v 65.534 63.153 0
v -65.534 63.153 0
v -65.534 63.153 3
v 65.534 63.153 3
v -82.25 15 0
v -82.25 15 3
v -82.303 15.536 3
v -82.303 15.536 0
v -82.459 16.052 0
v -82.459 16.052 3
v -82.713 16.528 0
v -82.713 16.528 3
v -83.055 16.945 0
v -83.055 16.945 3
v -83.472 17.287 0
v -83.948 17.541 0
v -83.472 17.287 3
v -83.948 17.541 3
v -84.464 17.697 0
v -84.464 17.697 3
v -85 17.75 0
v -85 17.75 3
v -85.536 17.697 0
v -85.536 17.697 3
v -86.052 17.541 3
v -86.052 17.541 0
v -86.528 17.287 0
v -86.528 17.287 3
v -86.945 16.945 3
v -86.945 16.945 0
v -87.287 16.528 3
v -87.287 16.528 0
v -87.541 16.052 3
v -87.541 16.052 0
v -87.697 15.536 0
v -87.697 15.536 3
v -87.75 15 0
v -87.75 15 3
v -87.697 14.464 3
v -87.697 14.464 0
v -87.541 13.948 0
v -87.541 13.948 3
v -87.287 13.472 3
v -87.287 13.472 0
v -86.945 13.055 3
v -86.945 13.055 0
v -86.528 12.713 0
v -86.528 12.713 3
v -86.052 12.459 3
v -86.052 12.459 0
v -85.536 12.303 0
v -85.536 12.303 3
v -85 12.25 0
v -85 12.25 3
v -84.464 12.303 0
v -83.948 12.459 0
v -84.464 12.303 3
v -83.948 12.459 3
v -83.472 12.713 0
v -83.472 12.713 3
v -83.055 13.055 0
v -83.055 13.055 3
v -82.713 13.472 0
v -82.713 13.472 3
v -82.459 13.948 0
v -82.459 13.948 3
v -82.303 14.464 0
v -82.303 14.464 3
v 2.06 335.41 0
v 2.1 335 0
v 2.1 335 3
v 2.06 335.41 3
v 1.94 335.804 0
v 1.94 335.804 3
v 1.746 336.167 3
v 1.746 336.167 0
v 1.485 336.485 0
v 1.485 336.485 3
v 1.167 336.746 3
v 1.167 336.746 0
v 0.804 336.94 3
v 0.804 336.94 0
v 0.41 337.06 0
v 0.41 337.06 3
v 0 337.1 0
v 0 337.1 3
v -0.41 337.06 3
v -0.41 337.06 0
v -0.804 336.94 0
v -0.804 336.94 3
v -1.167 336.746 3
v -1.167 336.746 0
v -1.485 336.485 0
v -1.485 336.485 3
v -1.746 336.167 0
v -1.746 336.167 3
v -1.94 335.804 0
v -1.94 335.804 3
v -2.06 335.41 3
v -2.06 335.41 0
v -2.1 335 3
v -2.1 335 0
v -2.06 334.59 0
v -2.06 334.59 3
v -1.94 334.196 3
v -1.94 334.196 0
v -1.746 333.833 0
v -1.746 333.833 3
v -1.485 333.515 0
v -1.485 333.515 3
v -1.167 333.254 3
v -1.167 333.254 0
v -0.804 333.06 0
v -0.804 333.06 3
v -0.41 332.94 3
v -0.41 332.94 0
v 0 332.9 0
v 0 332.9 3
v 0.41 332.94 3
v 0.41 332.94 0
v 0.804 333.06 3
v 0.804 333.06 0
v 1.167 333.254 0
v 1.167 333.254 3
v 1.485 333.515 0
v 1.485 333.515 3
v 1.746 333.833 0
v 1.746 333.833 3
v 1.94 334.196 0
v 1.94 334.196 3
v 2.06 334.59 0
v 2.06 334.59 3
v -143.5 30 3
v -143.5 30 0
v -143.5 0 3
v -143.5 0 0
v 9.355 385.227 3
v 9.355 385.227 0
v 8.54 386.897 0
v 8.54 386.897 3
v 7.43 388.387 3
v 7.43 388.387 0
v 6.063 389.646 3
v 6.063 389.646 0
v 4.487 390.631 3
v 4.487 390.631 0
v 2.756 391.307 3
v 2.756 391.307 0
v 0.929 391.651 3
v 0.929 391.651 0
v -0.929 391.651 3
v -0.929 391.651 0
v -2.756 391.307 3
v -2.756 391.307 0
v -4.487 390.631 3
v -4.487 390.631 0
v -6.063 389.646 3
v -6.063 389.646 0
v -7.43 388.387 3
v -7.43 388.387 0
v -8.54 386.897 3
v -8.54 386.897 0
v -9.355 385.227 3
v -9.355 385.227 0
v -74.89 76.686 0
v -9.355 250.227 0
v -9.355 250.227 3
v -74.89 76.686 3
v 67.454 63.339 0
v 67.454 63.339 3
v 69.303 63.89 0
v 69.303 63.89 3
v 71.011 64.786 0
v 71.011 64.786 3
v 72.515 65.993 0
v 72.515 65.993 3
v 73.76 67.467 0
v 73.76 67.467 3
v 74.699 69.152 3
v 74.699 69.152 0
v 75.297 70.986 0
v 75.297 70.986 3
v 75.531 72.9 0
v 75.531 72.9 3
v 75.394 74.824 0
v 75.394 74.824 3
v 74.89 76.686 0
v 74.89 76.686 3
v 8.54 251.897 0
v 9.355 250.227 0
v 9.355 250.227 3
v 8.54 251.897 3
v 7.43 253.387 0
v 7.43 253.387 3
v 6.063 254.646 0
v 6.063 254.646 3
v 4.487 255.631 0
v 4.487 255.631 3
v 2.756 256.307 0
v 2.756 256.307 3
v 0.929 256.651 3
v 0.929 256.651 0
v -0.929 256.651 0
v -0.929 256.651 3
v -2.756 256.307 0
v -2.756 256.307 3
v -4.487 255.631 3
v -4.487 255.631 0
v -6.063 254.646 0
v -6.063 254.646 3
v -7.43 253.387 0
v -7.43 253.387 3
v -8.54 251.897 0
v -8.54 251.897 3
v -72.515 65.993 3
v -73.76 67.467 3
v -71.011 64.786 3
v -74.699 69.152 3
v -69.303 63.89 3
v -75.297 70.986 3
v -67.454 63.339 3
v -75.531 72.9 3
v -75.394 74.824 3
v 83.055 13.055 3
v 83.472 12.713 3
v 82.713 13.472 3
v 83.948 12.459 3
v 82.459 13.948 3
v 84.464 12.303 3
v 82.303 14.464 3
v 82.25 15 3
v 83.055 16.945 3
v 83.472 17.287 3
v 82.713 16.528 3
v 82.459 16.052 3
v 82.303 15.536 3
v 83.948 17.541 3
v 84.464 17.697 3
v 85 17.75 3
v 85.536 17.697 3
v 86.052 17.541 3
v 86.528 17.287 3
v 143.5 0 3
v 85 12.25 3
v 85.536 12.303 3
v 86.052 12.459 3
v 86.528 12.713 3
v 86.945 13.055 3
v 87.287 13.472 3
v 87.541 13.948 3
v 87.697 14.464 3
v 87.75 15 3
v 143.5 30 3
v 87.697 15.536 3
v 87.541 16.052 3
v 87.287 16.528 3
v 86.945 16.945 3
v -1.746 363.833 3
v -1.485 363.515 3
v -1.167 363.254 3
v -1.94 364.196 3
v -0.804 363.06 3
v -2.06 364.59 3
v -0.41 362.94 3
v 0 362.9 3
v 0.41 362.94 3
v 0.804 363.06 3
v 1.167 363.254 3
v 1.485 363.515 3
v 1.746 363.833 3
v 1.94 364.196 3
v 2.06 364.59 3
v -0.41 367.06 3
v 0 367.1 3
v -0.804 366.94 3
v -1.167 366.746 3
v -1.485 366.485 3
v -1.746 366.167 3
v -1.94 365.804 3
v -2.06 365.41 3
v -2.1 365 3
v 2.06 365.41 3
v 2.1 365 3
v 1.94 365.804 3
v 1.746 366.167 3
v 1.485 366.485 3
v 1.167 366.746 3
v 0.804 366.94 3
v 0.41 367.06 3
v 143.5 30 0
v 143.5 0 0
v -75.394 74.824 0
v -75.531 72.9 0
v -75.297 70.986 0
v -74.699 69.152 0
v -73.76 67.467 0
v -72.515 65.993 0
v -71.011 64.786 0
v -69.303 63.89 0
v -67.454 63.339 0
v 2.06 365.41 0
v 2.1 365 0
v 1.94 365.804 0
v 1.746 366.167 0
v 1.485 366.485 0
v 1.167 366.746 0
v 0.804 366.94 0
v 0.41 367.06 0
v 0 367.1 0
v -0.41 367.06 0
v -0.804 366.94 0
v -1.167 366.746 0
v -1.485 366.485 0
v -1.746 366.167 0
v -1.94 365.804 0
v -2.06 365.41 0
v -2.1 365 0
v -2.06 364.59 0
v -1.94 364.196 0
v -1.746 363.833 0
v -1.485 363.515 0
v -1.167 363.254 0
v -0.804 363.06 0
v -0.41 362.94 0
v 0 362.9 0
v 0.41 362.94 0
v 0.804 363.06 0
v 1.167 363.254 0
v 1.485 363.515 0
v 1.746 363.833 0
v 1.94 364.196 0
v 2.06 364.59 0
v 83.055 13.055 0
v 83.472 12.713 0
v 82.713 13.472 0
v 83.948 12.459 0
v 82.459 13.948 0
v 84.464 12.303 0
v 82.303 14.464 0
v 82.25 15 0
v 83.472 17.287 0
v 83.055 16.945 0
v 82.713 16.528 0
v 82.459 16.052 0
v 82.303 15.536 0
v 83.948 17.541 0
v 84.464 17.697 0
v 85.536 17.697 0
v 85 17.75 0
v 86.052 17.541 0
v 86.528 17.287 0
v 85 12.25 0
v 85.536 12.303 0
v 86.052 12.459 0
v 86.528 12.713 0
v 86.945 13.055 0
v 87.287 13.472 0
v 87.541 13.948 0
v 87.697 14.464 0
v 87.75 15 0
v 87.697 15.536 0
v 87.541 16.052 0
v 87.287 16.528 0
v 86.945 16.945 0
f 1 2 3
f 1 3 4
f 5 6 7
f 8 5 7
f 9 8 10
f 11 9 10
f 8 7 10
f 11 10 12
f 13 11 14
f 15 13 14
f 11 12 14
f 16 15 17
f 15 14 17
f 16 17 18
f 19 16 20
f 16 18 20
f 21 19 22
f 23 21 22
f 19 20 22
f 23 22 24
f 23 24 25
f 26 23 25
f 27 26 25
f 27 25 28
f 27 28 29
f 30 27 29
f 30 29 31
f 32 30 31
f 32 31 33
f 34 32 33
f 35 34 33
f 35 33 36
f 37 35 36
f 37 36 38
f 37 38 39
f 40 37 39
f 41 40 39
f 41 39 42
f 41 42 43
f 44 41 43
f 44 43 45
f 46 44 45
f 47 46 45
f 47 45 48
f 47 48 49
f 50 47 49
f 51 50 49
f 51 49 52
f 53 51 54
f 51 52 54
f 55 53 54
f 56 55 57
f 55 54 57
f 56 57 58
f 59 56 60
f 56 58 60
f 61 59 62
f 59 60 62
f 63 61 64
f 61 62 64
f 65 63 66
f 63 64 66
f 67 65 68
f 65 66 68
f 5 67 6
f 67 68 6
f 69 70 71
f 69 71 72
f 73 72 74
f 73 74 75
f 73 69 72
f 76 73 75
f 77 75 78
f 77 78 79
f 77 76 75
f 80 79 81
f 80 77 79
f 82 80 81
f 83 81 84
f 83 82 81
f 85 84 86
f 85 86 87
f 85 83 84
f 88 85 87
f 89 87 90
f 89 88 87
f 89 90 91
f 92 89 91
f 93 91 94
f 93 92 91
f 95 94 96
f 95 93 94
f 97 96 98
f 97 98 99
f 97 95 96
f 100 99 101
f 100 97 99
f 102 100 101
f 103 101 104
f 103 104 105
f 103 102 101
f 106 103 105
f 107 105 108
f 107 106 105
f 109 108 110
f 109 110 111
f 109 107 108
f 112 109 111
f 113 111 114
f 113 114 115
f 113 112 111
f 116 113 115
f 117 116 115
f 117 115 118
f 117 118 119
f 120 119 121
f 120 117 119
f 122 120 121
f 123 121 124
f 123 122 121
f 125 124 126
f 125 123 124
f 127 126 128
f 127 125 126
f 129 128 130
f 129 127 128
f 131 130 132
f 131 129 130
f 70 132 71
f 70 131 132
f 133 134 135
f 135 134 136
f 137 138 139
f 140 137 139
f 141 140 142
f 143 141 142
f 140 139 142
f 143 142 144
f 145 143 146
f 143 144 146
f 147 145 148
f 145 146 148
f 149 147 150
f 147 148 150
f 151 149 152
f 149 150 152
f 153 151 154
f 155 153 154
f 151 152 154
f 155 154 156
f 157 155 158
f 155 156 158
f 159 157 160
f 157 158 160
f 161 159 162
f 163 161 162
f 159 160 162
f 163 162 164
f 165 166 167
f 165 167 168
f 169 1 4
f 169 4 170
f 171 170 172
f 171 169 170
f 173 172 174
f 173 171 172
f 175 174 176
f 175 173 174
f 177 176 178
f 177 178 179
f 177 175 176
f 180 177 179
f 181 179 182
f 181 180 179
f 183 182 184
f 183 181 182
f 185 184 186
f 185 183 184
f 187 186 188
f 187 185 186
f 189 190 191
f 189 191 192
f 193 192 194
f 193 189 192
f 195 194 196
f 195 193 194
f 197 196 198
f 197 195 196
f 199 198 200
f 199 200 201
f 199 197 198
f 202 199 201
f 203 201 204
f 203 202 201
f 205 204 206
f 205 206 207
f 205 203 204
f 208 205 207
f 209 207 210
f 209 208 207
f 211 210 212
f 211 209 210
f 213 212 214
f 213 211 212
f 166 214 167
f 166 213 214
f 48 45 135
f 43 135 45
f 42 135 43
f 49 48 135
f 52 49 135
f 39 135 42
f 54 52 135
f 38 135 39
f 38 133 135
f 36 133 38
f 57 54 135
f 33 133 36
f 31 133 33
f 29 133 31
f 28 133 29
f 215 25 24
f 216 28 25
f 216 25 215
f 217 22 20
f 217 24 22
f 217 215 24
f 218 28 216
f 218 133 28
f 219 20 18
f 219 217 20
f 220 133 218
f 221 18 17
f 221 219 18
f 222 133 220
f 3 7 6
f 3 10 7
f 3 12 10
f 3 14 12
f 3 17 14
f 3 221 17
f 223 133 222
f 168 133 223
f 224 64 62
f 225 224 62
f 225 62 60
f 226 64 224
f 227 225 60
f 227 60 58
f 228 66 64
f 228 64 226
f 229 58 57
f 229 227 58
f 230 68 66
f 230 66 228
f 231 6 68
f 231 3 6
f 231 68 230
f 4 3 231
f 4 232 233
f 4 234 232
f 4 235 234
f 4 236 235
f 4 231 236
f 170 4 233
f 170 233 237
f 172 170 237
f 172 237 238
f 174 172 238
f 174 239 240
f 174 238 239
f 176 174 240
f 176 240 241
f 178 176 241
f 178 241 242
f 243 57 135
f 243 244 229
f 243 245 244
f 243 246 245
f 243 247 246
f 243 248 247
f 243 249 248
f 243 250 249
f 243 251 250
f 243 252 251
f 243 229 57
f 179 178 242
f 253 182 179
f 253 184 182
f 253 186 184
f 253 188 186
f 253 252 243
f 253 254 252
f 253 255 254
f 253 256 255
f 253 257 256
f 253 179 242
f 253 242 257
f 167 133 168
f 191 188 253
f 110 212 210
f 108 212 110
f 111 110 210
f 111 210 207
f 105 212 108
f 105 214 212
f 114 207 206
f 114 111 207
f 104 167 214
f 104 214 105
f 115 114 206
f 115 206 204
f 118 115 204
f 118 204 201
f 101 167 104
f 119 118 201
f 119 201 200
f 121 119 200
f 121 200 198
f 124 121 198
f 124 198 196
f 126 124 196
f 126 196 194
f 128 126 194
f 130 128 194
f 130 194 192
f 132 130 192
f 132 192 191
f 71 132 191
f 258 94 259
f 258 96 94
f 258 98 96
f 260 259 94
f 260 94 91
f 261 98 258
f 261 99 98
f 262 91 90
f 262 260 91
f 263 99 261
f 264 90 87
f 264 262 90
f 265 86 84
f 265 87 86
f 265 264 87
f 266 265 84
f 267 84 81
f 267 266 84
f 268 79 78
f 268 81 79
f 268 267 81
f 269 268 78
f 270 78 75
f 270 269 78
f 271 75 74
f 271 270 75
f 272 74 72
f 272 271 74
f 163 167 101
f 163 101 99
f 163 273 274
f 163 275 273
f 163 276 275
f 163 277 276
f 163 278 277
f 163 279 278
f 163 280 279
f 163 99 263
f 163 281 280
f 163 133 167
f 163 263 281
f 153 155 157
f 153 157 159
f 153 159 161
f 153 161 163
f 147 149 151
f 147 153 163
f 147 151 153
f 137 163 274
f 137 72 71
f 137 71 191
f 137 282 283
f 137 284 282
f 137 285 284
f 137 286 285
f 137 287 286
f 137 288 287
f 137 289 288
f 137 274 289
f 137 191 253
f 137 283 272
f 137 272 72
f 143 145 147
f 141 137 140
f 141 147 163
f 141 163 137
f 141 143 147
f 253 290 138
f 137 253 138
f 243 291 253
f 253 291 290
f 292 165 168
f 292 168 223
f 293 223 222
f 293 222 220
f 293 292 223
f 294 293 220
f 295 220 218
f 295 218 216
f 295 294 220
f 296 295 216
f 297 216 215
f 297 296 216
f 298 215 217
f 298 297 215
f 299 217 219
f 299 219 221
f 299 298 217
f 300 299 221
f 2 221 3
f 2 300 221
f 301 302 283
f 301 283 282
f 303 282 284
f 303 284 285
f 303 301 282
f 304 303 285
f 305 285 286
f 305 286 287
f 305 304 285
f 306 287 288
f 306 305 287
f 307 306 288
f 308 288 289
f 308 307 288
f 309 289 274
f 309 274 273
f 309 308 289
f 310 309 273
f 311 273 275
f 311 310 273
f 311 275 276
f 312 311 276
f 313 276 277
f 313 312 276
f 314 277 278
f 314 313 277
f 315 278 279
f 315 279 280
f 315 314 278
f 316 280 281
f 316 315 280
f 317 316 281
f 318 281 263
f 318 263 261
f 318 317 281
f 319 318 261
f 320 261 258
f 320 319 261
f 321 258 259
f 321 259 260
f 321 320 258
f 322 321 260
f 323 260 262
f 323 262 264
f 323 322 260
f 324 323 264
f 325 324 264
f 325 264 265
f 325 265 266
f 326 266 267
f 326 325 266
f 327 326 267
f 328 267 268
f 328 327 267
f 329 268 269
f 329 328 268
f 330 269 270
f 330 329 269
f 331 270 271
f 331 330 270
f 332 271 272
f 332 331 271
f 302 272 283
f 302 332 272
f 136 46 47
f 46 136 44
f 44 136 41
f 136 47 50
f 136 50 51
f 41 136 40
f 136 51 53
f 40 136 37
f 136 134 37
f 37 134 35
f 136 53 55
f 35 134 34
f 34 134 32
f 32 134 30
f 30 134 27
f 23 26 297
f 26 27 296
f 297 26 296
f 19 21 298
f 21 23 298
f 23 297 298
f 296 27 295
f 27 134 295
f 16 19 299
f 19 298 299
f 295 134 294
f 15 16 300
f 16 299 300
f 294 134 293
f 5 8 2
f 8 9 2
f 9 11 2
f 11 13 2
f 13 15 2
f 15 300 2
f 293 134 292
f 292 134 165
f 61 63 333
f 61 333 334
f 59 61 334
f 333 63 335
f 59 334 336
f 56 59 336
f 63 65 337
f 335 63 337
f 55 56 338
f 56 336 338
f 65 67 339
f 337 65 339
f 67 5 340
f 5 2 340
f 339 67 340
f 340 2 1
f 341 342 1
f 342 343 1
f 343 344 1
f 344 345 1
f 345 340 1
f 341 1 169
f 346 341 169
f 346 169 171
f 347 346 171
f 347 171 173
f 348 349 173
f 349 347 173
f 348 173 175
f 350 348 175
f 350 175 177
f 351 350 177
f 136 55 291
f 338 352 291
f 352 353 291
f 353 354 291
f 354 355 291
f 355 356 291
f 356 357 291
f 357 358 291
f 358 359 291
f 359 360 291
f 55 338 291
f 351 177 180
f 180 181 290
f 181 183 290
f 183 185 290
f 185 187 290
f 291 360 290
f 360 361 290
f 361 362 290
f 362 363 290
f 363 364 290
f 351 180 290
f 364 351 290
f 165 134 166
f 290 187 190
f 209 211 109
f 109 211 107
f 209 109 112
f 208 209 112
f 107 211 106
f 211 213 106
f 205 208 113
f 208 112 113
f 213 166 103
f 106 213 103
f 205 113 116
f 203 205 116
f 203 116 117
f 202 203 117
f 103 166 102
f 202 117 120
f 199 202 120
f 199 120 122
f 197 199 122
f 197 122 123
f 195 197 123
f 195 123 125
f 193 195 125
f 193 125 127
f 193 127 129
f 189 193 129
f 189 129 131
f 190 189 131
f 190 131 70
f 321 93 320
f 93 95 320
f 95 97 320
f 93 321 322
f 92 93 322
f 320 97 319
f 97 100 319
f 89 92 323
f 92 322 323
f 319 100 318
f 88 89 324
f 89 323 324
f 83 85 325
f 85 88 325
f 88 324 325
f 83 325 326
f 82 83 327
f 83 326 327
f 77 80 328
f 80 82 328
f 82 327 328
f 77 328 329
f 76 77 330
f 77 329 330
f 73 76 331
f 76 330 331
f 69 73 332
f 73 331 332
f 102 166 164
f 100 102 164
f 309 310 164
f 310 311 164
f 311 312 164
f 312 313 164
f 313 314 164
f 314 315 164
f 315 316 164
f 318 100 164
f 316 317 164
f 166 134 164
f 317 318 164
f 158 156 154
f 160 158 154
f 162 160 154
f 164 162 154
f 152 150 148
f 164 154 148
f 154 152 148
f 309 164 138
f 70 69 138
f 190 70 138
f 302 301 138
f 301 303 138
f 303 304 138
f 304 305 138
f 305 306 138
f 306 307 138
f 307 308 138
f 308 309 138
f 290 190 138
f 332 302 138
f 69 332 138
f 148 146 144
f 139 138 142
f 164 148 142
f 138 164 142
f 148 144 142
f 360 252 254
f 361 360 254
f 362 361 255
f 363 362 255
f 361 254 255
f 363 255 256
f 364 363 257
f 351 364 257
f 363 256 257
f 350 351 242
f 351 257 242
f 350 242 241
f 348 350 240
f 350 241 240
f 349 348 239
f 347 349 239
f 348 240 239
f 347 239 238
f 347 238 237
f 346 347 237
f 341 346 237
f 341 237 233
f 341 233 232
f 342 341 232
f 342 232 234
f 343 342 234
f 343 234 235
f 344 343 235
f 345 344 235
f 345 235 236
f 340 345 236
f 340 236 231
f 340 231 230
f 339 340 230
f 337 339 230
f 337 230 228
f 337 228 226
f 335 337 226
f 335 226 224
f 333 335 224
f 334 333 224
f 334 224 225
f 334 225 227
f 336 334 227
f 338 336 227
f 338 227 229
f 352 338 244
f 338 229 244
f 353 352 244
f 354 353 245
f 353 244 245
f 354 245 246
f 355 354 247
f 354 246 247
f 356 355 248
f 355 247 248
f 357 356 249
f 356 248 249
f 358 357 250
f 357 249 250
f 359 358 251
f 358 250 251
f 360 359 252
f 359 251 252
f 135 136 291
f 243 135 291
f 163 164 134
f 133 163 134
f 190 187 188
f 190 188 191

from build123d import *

# Parameters (mm, degrees)
CROQUIS1_R                   = 2.1
SALIENTE_EXTRUIR1_DEPTH      = 3
TALADRO_DE_MARGEN_PARA_M51_D = 5.5
CORTAR_EXTRUIR1_DEPTH        = 3


with BuildPart() as part:
    # Croquis1 → Saliente-Extruir1 (new body)
    with BuildSketch(Plane.XY):
        with BuildLine():
            Line((-143.5, 0), (143.5, 0))
            Line((143.5, 0), (143.5, 30))
            Line((143.5, 30), (9.355173022, 385.226719524))
            ThreePointArc((9.355173022, 385.226719524), (0, 391.693910765), (-9.355173022, 385.226719524))
            Line((-9.355173022, 385.226719524), (-143.5, 30))
            Line((-143.5, 30), (-143.5, 0))
        make_face()
        with Locations((0, 365)):
            Circle(CROQUIS1_R, mode=Mode.SUBTRACT)
        with Locations((0, 335)):
            Circle(CROQUIS1_R, mode=Mode.SUBTRACT)
    extrude(amount=SALIENTE_EXTRUIR1_DEPTH)

    # Taladro de margen para M51 (through all)
    with Locations(Plane(origin=(0, 0, 0), x_dir=(-1, 0, 0), z_dir=(0, 0, -1))):
        with Locations((-85, 15), (85, 15)):
            Hole(TALADRO_DE_MARGEN_PARA_M51_D / 2)

    # Croquis4 → Cortar-Extruir1 (cut)
    with BuildSketch(Plane(origin=(0, 0, 0), x_dir=(-1, 0, 0), z_dir=(0, 0, -1))):
        with BuildLine():
            Line((9.355173022, 250.226719524), (74.889584061, 76.686118864))
            ThreePointArc((74.889584061, 76.686118864), (73.760226731, 67.466838773), (65.534411039, 63.153310105))
            Line((65.534411039, 63.153310105), (-65.534411039, 63.153310105))
            ThreePointArc((-65.534411039, 63.153310105), (-73.760226731, 67.466838773), (-74.889584061, 76.686118864))
            Line((-74.889584061, 76.686118864), (-9.355173022, 250.226719524))
            ThreePointArc((-9.355173022, 250.226719524), (0, 256.693910765), (9.355173022, 250.226719524))
        make_face()
    extrude(amount=-CORTAR_EXTRUIR1_DEPTH, mode=Mode.SUBTRACT)


solid = part.part
